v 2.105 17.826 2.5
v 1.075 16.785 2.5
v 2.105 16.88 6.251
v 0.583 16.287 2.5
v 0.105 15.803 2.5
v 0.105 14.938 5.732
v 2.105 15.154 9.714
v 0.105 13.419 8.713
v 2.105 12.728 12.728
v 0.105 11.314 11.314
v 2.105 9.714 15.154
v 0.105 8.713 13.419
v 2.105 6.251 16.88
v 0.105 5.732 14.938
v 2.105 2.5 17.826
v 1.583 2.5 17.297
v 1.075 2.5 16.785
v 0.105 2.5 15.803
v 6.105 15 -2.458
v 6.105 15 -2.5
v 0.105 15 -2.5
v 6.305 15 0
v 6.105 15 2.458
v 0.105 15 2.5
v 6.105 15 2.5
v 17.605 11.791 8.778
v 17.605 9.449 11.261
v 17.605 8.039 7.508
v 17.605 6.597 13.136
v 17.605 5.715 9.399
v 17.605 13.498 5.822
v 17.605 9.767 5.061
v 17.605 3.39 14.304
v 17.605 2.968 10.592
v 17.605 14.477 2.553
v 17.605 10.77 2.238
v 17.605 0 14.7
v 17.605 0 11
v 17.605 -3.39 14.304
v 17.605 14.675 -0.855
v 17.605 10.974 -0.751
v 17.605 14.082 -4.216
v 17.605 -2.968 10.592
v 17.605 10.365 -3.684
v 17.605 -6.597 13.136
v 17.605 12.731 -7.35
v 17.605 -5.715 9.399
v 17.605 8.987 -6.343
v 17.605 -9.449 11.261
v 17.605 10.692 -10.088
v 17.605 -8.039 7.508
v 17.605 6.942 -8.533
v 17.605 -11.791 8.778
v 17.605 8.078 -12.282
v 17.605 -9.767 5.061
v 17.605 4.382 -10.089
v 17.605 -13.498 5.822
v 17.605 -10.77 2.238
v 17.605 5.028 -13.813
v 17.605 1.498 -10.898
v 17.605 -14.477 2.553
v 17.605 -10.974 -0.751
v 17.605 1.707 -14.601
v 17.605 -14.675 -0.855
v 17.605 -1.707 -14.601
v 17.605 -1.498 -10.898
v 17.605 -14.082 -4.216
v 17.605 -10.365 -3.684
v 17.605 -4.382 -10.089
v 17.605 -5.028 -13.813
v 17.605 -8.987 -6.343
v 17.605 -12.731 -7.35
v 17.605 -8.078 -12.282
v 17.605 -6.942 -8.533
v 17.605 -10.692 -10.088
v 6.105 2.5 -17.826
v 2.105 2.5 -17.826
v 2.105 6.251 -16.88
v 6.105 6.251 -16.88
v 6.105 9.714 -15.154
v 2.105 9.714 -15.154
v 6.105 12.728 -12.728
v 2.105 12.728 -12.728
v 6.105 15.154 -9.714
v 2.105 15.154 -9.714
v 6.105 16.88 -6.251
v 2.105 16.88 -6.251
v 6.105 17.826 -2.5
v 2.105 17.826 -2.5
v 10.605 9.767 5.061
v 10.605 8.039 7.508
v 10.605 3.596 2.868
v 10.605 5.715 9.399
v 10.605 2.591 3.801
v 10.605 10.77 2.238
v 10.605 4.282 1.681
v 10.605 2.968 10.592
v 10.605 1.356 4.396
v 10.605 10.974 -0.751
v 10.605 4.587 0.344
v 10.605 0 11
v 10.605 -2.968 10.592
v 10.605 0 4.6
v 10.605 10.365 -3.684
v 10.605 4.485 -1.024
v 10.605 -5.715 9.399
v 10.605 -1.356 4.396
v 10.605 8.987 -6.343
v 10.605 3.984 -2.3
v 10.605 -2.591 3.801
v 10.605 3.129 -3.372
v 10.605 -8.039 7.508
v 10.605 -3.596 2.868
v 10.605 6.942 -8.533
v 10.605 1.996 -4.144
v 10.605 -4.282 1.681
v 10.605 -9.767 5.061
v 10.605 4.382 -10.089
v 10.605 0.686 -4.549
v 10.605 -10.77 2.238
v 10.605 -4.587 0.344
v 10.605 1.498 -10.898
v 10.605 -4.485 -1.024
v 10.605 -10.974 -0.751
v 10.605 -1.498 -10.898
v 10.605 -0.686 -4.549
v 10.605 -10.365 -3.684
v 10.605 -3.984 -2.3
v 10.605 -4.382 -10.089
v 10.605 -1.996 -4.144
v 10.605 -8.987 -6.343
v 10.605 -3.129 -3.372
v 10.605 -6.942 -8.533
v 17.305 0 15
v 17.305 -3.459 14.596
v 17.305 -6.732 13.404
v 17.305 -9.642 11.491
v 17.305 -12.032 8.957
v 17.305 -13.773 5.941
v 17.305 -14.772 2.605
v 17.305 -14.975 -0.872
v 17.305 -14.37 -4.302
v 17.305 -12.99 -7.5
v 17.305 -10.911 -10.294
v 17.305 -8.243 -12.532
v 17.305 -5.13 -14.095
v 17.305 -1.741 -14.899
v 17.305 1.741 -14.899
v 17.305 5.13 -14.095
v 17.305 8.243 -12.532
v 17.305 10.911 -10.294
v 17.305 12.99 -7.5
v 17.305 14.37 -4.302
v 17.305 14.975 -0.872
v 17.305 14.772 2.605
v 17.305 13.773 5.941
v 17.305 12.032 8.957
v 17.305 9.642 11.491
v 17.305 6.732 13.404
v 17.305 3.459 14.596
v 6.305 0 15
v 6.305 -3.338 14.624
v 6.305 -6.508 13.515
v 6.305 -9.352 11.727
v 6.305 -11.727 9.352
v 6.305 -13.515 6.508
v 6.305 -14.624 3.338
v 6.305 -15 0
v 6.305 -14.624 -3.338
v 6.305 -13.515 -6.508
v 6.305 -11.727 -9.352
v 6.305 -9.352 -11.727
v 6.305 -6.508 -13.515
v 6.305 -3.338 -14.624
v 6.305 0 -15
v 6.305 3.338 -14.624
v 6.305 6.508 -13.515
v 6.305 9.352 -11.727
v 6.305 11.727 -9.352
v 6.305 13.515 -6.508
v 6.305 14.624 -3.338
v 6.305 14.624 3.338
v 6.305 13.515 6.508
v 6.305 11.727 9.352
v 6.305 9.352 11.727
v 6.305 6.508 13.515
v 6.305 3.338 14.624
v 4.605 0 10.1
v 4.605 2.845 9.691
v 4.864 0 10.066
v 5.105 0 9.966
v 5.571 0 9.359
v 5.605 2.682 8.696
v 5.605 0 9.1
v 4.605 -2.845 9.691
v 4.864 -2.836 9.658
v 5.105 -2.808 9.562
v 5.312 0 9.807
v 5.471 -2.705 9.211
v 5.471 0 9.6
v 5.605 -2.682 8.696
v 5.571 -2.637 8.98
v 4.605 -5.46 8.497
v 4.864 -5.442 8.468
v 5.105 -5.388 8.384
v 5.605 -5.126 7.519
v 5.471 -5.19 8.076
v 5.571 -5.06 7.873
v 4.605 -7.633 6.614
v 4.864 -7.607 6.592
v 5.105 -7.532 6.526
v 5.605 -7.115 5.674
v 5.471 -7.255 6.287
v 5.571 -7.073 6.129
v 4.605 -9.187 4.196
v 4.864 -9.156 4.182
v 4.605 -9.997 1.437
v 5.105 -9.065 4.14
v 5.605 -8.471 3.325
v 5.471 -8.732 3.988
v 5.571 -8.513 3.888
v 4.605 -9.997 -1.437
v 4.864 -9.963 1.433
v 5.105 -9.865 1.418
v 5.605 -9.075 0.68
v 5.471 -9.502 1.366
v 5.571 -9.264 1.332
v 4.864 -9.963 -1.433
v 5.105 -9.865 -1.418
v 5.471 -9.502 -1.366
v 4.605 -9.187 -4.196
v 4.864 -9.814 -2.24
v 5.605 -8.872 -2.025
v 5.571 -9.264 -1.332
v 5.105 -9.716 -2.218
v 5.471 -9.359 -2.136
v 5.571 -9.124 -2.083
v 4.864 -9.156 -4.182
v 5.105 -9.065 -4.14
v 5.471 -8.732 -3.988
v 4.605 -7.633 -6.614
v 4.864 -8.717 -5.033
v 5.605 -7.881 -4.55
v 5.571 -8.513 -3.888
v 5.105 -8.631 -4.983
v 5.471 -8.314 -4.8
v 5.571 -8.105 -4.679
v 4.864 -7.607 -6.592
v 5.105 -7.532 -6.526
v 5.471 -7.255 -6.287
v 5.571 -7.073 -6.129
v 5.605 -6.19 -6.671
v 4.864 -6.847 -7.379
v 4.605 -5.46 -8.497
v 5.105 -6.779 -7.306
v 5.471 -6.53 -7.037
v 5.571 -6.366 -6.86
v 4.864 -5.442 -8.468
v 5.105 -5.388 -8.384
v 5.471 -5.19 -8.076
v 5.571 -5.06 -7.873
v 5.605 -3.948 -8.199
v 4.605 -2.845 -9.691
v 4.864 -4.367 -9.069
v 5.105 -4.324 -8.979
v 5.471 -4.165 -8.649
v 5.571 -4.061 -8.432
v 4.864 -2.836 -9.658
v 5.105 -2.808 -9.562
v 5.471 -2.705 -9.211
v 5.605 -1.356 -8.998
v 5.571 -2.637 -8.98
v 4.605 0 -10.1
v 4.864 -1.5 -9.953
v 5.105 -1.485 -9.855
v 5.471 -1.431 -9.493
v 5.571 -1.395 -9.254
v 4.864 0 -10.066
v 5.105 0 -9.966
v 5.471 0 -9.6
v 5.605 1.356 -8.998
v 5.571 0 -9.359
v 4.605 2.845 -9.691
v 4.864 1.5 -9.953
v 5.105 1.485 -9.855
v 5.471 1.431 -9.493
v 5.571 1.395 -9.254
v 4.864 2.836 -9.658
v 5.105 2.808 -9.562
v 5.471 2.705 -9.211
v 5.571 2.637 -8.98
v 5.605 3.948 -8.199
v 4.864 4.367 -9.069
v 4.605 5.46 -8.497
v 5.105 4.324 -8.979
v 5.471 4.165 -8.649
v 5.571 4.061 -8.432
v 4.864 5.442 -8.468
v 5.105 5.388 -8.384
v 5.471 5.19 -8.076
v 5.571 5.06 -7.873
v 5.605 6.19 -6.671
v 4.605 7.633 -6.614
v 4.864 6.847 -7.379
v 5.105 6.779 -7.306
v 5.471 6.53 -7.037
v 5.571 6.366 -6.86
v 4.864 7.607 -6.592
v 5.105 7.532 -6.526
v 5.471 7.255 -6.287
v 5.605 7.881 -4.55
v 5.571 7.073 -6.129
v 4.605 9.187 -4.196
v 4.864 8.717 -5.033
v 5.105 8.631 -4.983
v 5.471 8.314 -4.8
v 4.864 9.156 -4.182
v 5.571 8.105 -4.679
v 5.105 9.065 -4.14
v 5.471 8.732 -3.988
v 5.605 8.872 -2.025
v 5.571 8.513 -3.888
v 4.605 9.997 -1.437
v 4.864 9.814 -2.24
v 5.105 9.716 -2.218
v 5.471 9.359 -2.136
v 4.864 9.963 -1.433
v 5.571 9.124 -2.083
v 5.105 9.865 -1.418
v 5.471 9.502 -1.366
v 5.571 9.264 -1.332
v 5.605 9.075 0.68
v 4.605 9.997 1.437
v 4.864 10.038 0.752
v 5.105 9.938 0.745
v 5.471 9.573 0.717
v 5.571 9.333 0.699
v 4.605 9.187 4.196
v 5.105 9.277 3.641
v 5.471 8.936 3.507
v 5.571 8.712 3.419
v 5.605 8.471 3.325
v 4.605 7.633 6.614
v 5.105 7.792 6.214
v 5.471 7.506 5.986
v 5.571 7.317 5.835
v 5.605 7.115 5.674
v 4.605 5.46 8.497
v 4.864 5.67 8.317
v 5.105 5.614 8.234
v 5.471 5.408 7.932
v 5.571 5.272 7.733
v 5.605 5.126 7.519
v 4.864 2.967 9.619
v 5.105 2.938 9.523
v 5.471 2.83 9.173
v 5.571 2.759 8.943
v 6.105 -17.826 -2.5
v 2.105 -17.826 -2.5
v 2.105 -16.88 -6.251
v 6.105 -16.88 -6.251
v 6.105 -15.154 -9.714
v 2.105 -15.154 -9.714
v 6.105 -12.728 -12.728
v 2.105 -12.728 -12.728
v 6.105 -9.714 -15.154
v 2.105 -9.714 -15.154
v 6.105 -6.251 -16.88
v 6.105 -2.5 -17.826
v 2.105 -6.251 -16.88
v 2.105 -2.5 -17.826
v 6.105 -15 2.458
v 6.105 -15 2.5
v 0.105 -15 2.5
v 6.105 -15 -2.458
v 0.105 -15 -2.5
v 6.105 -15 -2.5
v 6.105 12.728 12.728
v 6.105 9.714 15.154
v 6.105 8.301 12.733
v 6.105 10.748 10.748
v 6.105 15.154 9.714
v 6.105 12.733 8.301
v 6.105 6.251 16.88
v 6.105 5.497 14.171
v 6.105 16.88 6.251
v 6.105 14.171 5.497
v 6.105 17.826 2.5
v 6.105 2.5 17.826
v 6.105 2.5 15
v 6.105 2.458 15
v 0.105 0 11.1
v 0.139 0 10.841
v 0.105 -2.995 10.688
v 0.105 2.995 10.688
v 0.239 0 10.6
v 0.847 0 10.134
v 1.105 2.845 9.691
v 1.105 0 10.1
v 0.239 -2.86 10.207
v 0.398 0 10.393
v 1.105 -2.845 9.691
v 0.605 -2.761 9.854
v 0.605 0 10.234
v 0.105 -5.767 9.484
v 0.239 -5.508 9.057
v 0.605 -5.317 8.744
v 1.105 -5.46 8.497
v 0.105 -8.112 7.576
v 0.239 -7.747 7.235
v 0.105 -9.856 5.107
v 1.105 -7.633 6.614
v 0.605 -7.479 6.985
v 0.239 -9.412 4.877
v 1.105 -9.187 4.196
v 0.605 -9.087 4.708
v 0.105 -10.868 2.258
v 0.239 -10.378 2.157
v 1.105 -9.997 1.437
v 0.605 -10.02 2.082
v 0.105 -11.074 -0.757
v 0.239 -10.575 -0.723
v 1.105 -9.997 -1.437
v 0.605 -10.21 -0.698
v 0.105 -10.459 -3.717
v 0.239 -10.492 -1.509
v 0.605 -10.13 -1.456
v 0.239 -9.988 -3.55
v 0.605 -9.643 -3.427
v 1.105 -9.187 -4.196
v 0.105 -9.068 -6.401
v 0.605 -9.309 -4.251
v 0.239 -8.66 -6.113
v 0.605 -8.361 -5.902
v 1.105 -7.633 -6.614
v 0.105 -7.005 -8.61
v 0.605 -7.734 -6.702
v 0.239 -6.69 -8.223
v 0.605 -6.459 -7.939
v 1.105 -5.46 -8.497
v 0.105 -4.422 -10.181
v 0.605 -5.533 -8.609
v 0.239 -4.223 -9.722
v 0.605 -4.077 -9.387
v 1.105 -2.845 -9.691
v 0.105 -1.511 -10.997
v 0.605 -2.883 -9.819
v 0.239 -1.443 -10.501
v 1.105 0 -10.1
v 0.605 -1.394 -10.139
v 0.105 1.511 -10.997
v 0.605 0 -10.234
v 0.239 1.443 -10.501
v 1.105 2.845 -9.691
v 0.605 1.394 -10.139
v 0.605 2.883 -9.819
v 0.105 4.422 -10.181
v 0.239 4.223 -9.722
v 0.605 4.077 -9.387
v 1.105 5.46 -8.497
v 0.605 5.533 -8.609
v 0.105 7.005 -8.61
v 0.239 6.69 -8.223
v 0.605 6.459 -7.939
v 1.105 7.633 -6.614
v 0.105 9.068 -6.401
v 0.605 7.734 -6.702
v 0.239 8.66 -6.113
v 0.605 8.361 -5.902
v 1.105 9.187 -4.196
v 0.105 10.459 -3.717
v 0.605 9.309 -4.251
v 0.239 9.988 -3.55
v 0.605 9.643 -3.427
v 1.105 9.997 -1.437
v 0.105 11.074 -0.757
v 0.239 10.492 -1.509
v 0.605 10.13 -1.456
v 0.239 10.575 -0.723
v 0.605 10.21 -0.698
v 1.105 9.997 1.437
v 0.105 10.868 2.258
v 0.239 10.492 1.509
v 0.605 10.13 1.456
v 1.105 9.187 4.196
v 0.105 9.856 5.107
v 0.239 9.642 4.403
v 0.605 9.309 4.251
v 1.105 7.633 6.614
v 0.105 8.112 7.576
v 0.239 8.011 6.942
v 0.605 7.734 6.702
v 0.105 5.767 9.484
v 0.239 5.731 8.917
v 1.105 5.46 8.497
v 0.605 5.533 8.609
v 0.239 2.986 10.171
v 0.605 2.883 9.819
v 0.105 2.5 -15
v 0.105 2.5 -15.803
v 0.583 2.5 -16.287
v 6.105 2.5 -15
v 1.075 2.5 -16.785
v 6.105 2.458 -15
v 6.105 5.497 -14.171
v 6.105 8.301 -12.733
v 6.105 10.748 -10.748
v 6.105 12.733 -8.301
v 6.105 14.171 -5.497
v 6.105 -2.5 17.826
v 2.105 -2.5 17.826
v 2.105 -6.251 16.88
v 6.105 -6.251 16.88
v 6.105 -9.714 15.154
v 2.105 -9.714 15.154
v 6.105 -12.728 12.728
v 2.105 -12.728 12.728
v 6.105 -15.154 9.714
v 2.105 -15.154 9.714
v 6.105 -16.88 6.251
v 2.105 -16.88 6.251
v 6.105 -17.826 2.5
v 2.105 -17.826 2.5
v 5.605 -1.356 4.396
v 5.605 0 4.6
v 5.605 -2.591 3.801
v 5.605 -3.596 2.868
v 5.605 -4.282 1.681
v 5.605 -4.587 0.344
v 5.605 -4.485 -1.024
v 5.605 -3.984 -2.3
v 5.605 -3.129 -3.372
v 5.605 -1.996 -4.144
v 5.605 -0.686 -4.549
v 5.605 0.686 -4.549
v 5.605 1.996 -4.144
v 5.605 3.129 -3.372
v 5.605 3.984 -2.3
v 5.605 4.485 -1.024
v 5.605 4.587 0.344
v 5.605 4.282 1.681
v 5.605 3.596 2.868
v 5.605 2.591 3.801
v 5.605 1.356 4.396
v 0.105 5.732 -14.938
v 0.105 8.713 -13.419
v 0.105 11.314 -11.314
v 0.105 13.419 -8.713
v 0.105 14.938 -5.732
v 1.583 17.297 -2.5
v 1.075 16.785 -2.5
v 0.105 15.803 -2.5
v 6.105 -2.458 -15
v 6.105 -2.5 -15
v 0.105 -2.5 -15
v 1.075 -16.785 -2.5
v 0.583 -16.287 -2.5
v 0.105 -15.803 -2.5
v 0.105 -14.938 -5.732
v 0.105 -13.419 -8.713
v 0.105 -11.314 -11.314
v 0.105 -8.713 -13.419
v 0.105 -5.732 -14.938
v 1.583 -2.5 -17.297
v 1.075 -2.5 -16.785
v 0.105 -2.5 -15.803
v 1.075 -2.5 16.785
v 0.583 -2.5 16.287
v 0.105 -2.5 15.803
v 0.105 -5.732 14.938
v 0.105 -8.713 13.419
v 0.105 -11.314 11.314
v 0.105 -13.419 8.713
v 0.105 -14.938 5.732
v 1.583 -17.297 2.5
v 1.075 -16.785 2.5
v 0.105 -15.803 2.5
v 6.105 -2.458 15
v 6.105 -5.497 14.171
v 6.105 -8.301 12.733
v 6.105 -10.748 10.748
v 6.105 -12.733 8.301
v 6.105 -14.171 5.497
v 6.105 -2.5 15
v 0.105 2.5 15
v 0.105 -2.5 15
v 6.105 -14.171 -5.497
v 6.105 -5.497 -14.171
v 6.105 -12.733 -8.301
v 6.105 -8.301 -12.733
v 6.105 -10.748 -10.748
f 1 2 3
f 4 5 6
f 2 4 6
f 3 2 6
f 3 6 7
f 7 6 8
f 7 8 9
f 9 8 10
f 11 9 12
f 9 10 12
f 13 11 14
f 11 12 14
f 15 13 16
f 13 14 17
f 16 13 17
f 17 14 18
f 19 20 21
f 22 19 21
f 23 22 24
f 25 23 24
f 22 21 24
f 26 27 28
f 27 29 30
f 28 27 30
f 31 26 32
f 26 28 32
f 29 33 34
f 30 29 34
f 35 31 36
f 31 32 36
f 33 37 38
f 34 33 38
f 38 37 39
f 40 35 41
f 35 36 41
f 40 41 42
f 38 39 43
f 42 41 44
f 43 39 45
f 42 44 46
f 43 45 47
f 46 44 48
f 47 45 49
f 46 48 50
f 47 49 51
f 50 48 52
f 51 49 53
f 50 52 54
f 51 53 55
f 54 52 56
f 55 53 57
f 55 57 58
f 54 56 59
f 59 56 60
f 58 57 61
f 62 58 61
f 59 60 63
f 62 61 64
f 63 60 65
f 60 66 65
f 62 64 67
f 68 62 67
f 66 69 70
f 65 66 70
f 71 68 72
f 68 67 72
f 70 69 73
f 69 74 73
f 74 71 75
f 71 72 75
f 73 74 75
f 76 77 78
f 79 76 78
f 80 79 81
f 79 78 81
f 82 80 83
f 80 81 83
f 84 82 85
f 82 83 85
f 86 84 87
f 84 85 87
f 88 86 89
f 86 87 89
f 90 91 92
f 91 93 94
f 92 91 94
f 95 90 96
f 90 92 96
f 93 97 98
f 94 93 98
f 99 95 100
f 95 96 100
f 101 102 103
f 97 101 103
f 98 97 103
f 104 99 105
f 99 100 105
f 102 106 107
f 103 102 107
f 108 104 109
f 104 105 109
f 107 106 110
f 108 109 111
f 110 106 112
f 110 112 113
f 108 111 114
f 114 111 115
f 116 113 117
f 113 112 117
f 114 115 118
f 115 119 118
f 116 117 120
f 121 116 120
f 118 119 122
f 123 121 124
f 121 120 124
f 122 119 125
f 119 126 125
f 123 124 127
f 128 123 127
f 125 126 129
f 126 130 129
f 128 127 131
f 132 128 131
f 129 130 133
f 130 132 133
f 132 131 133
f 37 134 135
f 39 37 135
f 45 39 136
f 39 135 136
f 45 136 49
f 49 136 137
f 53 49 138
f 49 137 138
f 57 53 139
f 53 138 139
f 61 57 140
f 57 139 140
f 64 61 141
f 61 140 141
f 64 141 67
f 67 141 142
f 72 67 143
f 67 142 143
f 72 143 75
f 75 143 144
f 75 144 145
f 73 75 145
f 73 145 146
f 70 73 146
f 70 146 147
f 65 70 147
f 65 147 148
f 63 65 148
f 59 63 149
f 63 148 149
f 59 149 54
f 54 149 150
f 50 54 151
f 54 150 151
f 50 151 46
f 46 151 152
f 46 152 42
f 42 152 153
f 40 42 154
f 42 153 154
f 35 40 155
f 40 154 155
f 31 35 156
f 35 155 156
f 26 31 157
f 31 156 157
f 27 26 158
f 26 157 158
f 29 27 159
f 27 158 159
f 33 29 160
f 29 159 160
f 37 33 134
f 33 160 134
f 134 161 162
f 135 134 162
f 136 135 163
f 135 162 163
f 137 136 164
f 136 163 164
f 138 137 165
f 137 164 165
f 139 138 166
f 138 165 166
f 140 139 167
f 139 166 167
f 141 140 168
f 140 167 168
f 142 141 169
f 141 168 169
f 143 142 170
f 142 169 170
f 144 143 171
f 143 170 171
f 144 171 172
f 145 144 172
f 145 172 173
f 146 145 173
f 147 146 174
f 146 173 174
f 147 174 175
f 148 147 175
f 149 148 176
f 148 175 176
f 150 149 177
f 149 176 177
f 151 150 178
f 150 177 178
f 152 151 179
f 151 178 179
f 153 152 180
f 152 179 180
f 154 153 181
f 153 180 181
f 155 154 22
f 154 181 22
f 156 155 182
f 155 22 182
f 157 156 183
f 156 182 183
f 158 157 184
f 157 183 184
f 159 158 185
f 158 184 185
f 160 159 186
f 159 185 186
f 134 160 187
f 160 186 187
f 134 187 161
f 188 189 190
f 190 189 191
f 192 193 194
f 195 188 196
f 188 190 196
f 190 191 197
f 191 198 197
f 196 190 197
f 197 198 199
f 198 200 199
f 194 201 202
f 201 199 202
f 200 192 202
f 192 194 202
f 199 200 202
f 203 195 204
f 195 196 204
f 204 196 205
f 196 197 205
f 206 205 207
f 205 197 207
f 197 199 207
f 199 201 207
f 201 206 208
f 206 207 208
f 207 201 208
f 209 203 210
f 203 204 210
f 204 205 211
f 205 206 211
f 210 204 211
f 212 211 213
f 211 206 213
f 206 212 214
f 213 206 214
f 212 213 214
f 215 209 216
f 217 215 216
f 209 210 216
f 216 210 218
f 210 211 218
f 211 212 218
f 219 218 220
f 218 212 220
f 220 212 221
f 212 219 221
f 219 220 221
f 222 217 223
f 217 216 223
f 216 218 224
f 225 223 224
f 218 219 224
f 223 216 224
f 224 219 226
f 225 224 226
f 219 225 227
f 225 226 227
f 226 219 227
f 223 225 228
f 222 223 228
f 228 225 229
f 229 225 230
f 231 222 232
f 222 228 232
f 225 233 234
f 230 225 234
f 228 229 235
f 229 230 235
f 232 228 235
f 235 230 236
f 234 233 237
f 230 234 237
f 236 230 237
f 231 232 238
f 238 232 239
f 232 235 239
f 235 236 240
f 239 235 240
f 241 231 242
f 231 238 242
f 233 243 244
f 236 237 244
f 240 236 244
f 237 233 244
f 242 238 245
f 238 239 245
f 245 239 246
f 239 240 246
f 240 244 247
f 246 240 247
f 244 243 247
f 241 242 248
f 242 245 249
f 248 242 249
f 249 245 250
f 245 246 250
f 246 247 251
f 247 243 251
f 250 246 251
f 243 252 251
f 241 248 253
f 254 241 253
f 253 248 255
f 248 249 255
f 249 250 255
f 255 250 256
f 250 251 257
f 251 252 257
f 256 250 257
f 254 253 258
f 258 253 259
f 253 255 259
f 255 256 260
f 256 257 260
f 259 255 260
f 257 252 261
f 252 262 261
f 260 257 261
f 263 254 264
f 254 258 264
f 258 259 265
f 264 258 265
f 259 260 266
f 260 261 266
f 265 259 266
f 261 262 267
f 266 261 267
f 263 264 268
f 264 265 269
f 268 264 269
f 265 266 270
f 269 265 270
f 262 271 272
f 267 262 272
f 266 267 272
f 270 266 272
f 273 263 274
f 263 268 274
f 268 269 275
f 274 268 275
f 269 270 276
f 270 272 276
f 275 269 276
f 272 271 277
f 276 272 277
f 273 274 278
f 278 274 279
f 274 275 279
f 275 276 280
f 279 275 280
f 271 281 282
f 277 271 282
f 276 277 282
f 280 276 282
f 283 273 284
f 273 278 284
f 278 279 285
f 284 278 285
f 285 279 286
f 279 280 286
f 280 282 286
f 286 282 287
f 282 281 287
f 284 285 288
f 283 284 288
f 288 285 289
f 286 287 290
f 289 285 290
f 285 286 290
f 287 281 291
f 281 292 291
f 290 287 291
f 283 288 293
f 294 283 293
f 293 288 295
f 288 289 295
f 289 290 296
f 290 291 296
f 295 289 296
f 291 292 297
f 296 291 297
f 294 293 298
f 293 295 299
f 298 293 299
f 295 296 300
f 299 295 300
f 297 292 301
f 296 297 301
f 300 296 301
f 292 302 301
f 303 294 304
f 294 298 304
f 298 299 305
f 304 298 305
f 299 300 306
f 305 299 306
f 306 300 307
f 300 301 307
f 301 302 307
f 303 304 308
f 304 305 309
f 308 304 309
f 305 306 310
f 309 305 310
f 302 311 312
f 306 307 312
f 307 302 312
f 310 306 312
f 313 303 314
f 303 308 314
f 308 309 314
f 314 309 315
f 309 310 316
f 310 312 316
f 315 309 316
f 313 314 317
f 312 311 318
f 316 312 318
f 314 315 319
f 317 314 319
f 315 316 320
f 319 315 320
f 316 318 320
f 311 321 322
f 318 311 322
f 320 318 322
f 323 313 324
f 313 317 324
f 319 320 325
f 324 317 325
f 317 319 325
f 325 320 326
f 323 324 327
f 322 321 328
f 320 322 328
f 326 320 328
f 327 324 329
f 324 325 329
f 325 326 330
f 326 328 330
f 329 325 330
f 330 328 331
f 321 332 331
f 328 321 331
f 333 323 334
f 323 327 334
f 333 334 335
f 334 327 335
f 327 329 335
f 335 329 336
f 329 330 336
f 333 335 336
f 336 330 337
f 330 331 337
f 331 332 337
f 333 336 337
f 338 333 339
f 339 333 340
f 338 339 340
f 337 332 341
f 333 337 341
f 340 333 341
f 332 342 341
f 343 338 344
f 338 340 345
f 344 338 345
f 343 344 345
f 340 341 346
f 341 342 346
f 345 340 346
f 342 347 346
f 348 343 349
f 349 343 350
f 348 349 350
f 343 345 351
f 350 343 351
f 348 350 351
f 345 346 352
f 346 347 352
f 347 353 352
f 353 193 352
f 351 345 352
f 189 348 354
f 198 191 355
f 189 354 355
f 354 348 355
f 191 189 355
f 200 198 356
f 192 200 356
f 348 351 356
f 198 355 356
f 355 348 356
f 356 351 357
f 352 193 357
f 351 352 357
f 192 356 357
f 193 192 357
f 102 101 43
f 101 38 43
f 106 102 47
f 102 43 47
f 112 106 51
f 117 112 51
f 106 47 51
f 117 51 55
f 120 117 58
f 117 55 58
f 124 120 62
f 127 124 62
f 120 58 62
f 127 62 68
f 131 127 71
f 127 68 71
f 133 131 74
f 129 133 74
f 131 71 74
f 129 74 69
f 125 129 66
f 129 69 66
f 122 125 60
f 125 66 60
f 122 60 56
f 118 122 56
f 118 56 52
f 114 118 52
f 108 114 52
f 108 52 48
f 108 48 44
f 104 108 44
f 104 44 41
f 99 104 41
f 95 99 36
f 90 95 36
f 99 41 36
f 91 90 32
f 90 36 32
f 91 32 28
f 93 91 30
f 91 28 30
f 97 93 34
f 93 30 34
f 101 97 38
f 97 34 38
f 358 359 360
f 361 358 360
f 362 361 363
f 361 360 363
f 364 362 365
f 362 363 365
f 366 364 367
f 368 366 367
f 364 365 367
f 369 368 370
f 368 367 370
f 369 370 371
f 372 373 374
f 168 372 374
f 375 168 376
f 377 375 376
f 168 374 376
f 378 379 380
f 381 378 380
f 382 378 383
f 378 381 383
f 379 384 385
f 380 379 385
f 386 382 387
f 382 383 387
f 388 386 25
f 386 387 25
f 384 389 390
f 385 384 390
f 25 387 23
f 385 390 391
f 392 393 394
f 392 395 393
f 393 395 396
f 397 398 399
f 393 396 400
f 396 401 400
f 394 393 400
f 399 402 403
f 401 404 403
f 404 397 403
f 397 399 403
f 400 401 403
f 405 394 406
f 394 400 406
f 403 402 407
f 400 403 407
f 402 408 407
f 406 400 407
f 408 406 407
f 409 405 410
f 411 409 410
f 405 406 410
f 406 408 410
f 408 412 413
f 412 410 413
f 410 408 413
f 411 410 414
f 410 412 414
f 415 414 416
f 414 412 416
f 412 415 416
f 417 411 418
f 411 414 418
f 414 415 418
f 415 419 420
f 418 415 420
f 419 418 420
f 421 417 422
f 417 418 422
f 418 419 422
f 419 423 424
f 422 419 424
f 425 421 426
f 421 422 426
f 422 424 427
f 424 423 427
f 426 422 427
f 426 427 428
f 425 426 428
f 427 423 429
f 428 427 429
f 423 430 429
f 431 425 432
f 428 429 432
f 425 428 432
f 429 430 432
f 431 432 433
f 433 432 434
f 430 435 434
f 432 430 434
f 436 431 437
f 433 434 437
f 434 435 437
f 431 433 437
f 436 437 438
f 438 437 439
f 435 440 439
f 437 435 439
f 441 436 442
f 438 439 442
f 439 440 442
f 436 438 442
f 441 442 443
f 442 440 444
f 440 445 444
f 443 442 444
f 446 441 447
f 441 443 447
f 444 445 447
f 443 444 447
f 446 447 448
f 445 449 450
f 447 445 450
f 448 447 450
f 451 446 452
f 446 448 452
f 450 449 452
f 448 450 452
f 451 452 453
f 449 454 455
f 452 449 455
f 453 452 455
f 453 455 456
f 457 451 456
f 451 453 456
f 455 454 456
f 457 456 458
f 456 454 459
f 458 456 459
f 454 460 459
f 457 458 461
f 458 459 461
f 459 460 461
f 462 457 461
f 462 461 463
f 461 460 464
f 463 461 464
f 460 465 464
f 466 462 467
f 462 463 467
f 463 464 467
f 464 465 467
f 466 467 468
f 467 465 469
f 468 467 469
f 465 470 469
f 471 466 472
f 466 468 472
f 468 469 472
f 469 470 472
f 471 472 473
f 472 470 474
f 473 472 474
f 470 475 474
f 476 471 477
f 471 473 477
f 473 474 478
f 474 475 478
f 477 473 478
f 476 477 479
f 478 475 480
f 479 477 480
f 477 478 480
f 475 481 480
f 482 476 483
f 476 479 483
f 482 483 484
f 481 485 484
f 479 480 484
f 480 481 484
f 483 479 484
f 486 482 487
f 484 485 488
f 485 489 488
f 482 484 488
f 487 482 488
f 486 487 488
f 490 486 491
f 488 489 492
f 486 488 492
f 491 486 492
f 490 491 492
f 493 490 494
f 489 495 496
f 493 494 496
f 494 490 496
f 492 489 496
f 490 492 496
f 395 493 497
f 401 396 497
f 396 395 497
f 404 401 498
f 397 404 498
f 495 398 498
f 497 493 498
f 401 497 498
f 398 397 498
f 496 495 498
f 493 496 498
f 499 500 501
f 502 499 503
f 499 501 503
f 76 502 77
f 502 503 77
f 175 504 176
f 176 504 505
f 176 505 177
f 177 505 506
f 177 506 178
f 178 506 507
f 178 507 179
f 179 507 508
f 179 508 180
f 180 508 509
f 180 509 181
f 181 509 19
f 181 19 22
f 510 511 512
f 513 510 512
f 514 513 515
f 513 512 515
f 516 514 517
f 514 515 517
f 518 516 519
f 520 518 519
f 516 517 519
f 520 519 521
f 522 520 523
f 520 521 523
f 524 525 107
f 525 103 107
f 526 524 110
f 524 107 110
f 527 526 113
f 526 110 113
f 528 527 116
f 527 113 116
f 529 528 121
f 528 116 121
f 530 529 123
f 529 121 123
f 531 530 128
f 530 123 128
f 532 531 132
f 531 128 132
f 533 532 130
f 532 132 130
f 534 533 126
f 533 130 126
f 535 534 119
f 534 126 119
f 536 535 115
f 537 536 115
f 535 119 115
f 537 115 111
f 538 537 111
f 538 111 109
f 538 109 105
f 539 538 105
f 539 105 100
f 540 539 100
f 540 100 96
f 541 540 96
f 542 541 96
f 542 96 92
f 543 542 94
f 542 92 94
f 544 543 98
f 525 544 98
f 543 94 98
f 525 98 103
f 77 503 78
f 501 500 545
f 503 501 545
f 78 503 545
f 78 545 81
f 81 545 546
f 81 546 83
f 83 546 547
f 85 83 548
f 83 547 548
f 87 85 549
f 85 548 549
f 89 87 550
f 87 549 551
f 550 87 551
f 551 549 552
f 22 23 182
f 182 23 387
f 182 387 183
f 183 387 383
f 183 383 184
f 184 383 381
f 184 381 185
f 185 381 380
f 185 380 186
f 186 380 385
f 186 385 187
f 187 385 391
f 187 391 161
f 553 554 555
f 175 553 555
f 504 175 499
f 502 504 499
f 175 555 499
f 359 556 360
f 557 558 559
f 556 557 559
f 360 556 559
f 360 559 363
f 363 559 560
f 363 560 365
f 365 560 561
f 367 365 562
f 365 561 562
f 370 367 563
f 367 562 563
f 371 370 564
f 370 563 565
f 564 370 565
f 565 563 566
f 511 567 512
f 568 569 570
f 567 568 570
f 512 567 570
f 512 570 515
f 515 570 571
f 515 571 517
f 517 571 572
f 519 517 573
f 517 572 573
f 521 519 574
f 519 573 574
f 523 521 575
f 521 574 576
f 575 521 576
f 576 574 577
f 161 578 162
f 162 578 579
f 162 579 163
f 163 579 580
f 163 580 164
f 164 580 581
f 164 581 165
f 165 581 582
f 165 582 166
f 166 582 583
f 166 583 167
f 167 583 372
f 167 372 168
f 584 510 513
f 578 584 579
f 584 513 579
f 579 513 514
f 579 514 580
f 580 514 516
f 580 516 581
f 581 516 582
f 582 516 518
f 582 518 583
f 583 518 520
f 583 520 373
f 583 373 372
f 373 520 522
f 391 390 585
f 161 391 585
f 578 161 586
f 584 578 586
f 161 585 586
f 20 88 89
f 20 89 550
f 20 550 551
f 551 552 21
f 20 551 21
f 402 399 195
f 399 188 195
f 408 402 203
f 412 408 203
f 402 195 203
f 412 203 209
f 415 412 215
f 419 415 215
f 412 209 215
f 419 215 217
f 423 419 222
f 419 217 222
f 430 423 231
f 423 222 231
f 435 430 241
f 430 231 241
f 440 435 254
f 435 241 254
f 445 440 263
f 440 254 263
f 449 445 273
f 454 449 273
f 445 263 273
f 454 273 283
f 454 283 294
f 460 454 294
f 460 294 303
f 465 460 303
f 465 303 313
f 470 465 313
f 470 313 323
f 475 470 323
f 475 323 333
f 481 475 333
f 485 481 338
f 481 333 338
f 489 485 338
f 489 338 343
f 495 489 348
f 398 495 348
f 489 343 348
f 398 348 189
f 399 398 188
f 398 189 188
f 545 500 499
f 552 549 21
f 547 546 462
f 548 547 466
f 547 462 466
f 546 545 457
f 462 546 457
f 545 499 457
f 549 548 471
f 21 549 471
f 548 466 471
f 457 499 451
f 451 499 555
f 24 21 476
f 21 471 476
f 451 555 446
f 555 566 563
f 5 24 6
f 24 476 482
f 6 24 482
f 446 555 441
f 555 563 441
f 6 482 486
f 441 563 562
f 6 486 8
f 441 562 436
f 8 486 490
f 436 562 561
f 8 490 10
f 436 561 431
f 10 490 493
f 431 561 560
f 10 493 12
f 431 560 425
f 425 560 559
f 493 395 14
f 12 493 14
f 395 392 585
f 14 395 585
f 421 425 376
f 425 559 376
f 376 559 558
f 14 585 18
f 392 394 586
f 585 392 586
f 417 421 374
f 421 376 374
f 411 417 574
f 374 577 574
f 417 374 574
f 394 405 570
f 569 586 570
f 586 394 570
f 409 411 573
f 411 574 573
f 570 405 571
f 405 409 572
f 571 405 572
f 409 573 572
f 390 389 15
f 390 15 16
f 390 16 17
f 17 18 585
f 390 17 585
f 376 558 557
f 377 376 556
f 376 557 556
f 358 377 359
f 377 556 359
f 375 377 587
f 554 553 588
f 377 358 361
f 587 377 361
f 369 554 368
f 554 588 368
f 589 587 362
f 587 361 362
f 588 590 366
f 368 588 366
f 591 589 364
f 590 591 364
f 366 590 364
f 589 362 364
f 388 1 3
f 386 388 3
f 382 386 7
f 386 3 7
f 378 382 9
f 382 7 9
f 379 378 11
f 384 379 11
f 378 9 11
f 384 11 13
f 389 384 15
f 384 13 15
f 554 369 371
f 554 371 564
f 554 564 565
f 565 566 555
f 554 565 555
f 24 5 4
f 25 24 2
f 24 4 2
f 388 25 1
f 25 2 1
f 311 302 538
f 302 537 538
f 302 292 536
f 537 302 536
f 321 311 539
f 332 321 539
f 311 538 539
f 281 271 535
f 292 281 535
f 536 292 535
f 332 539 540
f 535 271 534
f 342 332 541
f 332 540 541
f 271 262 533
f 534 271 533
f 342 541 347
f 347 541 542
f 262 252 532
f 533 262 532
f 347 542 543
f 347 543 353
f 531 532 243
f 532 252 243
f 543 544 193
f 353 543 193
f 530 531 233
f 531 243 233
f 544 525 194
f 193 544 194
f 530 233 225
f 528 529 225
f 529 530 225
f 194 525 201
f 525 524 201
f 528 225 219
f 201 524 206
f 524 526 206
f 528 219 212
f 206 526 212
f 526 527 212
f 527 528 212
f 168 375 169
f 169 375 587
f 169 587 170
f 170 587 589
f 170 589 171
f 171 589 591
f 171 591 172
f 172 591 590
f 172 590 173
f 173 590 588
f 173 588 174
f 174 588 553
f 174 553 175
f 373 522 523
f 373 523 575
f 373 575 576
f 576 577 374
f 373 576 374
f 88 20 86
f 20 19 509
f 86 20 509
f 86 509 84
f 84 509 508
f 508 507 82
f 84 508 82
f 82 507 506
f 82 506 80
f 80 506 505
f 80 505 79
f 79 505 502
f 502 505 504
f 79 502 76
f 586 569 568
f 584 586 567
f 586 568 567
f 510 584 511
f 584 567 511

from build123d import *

# Parameters (mm, degrees)
CUT_EXTRUDE3_DEPTH = 31.890937182
CIRPATTERN1_COUNT  = 4
CHAMFER1_SIZE      = 0.3


with BuildPart() as part:
    # Sketch1 → Revolve2 (revolve)
    with BuildSketch(Plane.XY, mode=Mode.PRIVATE) as revolve2_sk:
        with BuildLine():
            Line((17.605343981, 11), (17.605343981, 15))
            Line((17.605343981, 15), (6.305343981, 15))
            ThreePointArc((6.305343981, 15), (6.163922625, 15.058578644), (6.105343981, 15.2))
            Line((6.105343981, 15.2), (6.105343981, 18))
            Line((6.105343981, 18), (2.105343981, 18))
            Line((2.105343981, 18), (0.105343981, 16))
            Line((0.105343981, 16), (0.105343981, 11.1))
            ThreePointArc((0.105343981, 11.1), (0.3982372, 10.392893219), (1.105343981, 10.1))
            Line((1.105343981, 10.1), (4.605343981, 10.1))
            ThreePointArc((4.605343981, 10.1), (5.312450762, 9.807106781), (5.605343981, 9.1))
            Line((5.605343981, 9.1), (5.605343981, 4.6))
            Line((5.605343981, 4.6), (10.605343981, 4.6))
            Line((10.605343981, 4.6), (10.605343981, 11))
            Line((10.605343981, 11), (17.605343981, 11))
        make_face()
    revolve(revolve2_sk.sketch.rotate(Axis((0, 0, 0), (1, 0, 0)), 90), axis=Axis((0, 0, 0), (1, 0, 0)))

    # Sketch5 → Cut-Extrude3 (cut, through all)
    with BuildSketch(Plane.ZY.offset(-0.105343981)):
        with BuildLine():
            Line((0, 15), (0, 16))
            ThreePointArc((0, 16), (-1.253856039, 15.950794495), (-2.5, 15.803480629))
            Line((-2.5, 15.803480629), (-2.5, 15))
            Line((-2.5, 15), (0, 15))
        make_face()
        with BuildLine():
            ThreePointArc((2.5, 15.803480629), (1.253856039, 15.950794495), (0, 16))
            Line((0, 16), (0, 15))
            Line((0, 15), (2.5, 15))
            Line((2.5, 15), (2.5, 15.803480629))
        make_face()
        with BuildLine():
            Line((0, 18.508345056), (0, 18))
            Line((0, 18), (0, 16))
            ThreePointArc((0, 16), (1.253856039, 15.950794495), (2.5, 15.803480629))
            Line((2.5, 15.803480629), (2.5, 18.508345056))
            Line((2.5, 18.508345056), (0, 18.508345056))
        make_face()
        with BuildLine():
            Line((0, 16), (0, 18))
            Line((0, 18), (0, 18.508345056))
            Line((0, 18.508345056), (-2.5, 18.508345056))
            Line((-2.5, 18.508345056), (-2.5, 15.803480629))
            ThreePointArc((-2.5, 15.803480629), (-1.253856039, 15.950794495), (0, 16))
        make_face()
    cut_extrude3 = extrude(amount=-CUT_EXTRUDE3_DEPTH, mode=Mode.SUBTRACT)

    # CirPattern1: Cut-Extrude3 ×4 about axis
    cirpattern1_axis = Axis((0, 0, 0), (1, 0, 0))
    for i in range(1, CIRPATTERN1_COUNT):
        add(cut_extrude3.rotate(cirpattern1_axis, i * 360 / CIRPATTERN1_COUNT), mode=Mode.SUBTRACT)

    # Chamfer1
    chamfer1_edges = [part.edges().sort_by_distance(p)[0] for p in [
        (17.605343981, 0, -15),
    ]]
    chamfer(chamfer1_edges, length=CHAMFER1_SIZE)


solid = part.part
